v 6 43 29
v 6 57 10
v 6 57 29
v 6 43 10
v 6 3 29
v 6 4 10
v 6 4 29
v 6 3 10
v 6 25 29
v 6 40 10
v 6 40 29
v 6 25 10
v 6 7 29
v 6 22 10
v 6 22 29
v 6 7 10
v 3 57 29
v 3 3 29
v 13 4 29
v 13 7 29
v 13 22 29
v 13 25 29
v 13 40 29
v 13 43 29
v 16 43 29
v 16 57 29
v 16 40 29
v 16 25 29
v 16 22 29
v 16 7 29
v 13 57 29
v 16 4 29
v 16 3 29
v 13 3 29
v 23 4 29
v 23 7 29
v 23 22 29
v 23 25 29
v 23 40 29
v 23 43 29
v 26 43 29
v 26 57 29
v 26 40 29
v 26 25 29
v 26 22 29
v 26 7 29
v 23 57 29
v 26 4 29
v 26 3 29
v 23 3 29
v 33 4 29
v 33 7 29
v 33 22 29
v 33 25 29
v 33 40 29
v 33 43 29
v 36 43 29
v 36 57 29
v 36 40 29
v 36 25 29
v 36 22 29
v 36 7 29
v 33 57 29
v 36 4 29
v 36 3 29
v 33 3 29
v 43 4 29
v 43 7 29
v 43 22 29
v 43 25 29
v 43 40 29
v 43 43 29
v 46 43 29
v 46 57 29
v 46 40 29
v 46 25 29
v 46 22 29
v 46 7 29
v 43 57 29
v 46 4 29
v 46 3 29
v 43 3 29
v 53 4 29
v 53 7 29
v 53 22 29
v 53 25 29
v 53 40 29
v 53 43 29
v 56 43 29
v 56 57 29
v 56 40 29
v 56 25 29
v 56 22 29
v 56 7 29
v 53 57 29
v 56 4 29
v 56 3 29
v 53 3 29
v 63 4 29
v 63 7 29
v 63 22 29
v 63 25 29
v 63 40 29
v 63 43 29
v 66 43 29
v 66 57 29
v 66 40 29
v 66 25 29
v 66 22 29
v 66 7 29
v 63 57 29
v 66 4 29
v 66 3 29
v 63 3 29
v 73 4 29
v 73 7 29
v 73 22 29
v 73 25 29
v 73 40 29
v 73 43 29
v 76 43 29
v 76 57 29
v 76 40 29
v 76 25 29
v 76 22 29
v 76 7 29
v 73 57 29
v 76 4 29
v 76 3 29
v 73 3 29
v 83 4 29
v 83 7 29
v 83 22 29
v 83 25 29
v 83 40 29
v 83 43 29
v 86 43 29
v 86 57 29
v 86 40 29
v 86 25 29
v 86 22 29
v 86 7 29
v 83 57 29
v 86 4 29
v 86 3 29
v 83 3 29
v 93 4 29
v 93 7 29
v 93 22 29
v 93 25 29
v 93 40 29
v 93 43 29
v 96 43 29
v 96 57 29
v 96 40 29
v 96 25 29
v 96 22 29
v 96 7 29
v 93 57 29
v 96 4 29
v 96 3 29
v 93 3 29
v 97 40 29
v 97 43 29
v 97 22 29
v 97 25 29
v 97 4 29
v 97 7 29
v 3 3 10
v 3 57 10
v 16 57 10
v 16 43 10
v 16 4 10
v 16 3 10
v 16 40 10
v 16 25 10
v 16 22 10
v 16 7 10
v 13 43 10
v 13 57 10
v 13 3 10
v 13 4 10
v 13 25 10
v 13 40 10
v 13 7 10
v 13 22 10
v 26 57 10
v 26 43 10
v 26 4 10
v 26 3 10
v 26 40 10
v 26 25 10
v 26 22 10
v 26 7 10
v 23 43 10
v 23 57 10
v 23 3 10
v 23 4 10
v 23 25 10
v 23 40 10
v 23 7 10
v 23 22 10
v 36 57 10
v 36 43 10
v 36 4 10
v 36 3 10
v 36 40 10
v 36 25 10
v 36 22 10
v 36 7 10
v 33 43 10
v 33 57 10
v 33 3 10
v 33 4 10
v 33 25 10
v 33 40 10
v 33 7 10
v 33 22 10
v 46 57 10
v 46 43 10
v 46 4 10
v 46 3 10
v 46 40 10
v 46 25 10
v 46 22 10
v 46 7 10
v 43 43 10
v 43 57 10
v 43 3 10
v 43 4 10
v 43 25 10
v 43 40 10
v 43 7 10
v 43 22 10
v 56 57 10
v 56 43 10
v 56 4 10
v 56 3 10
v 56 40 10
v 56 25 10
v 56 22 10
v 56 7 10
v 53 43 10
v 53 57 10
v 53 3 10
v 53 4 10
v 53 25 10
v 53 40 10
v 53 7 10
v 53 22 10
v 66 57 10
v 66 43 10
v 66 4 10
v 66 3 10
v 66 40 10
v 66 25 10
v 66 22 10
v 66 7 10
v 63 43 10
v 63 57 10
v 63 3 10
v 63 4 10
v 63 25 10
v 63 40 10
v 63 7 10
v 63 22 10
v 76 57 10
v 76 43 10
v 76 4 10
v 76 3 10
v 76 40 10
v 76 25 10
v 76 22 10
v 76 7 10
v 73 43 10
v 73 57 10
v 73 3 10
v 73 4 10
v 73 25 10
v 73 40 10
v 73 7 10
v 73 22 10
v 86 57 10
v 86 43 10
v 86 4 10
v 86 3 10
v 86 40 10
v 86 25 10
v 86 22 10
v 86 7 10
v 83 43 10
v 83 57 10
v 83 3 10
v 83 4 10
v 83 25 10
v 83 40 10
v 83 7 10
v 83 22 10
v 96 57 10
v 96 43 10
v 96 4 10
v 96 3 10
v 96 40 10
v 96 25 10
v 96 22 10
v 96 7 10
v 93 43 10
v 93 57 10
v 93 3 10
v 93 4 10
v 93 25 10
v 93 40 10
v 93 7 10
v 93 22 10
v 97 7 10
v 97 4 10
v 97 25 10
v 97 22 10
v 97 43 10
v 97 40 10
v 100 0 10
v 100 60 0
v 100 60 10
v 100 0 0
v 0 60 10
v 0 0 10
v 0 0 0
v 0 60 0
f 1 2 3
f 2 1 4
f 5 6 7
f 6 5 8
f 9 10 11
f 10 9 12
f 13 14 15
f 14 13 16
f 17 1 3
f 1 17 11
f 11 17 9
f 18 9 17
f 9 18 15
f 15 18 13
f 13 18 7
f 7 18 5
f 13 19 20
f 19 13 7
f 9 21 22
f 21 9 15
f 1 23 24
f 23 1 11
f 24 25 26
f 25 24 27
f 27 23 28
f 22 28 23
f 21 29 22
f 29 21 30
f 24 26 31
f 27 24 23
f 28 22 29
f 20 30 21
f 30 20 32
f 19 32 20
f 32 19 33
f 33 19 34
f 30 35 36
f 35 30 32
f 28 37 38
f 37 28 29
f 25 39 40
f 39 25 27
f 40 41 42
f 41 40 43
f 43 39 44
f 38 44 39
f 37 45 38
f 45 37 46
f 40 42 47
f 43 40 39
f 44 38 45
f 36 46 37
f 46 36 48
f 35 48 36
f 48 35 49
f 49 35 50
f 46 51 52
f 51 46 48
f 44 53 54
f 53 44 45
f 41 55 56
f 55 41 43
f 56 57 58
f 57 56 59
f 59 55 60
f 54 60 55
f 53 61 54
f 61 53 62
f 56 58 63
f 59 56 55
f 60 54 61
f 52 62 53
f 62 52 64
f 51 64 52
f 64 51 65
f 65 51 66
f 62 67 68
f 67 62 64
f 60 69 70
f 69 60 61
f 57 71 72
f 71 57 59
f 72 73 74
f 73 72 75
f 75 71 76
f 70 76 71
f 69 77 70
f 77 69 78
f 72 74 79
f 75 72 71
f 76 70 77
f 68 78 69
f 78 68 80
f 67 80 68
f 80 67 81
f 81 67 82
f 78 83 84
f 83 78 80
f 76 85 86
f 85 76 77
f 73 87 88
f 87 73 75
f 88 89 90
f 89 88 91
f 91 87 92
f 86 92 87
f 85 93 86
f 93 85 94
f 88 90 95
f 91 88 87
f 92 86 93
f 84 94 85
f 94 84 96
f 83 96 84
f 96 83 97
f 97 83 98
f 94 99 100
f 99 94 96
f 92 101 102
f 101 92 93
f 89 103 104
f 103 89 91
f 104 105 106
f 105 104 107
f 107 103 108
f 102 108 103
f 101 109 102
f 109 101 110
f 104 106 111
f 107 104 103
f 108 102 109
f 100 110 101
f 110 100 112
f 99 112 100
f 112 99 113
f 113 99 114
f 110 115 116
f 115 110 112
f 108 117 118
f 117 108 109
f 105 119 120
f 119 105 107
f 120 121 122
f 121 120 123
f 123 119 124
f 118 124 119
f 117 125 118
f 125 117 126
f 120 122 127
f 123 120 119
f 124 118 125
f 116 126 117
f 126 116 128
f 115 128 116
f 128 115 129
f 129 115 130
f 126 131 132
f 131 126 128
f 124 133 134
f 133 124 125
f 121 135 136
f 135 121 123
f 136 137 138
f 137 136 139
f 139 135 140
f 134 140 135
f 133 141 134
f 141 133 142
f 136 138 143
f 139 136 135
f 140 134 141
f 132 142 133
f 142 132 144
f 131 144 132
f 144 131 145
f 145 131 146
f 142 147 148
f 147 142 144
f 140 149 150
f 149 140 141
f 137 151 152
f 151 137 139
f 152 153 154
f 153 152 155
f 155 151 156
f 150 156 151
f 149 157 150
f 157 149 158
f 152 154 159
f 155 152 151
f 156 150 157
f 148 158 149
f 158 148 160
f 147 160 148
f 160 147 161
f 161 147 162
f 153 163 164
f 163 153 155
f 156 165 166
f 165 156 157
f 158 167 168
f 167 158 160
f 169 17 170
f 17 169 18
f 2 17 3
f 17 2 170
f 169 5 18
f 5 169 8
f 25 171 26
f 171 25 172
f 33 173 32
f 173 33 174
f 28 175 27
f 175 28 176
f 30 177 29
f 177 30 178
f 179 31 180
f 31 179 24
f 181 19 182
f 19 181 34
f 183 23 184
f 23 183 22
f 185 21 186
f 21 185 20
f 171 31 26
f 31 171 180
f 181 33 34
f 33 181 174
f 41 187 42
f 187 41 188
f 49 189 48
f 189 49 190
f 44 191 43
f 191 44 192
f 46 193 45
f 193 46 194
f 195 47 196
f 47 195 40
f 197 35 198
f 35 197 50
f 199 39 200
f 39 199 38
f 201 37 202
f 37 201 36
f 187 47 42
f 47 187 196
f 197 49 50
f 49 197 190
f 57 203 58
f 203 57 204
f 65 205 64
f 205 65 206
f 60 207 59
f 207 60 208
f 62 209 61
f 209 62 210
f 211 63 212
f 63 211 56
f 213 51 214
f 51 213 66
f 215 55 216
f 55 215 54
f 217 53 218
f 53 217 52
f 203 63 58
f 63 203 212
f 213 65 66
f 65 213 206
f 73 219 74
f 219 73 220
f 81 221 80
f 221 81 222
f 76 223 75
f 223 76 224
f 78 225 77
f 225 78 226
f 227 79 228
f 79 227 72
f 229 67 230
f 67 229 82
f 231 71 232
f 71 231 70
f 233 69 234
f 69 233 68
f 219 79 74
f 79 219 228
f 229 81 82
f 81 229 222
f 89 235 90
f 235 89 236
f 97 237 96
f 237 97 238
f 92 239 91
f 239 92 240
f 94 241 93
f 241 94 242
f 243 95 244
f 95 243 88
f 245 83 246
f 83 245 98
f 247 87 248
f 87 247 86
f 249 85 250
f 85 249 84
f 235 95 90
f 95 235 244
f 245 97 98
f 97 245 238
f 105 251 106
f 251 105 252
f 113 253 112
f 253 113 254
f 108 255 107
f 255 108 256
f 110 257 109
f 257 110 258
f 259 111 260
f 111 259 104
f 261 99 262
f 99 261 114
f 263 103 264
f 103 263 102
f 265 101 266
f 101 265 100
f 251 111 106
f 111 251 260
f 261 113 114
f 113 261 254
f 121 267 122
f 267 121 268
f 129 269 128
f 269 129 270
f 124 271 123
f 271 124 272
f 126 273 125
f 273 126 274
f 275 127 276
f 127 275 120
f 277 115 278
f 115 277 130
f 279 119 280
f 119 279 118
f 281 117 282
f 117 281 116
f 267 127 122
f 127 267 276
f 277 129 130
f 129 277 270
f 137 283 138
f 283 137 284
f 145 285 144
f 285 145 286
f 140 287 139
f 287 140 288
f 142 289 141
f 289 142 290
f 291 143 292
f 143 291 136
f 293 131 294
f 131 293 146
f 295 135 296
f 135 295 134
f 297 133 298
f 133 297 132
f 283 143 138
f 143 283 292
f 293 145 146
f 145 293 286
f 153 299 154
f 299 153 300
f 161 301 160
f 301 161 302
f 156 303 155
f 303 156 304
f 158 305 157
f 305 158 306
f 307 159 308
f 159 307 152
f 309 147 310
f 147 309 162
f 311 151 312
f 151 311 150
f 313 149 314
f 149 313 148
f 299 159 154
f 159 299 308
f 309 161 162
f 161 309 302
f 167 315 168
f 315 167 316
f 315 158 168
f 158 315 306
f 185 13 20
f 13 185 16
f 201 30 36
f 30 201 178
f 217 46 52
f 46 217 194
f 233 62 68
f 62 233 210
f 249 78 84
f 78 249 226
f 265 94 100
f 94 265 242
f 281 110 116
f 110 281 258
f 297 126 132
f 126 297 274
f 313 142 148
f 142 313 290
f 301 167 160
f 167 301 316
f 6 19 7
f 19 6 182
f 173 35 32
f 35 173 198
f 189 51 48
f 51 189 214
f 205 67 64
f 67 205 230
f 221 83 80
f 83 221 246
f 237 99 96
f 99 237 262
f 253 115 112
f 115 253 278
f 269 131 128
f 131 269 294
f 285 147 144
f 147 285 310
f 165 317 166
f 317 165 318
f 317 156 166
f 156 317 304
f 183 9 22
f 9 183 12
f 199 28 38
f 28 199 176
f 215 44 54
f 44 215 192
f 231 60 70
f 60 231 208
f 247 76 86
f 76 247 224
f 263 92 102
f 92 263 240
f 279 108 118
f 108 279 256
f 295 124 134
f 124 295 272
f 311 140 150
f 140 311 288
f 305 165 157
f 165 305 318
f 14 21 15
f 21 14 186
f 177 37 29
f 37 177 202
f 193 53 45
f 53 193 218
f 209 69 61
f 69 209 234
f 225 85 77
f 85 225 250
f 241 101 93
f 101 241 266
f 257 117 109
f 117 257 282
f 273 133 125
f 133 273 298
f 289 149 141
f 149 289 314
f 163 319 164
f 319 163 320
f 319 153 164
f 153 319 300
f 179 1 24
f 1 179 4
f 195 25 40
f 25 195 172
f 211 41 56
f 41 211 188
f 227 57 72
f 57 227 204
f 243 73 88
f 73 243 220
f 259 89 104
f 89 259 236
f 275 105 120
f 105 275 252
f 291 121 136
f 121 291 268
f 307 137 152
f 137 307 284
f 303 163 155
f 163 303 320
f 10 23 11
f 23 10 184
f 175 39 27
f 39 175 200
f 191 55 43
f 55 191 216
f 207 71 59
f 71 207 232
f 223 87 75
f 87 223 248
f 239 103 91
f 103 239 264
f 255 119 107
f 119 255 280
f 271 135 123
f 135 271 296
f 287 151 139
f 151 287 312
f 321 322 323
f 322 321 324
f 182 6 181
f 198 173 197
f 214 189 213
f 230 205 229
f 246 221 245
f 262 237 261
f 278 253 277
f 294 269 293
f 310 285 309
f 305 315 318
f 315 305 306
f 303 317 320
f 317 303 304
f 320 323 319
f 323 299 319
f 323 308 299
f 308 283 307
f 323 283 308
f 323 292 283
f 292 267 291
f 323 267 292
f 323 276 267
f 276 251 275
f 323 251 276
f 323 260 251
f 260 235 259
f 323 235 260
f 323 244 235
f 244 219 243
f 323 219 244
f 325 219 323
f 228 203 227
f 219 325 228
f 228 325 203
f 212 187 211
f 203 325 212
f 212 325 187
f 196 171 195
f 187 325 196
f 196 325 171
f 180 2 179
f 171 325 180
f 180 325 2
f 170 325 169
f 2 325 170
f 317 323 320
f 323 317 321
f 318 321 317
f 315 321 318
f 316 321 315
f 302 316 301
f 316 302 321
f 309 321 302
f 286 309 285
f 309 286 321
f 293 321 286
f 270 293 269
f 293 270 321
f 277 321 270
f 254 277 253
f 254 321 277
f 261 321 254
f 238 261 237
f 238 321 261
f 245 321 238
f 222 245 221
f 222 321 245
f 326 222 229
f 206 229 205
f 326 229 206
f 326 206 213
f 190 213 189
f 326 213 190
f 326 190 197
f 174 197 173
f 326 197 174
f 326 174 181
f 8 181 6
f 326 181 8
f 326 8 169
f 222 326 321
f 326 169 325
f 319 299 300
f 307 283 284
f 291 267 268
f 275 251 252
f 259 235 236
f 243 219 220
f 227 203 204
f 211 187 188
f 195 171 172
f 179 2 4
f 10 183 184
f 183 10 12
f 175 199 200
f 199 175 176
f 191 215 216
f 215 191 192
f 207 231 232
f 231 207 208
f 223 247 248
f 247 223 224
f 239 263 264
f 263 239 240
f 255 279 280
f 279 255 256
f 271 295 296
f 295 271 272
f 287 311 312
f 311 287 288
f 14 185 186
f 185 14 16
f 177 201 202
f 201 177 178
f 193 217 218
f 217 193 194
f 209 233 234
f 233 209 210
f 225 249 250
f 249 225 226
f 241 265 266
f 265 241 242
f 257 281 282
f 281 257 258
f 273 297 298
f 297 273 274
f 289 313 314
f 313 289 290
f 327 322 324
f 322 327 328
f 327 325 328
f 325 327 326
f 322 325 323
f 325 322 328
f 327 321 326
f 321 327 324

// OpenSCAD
$fn = 32;

// ----------------------------------------------------------------------
// Heatsink: cross fin block
// ----------------------------------------------------------------------

// --- parameters (mm) ---
base_l = 100;             // base length, X
base_w = 60;              // base width, Y
base_t = 10;              // base plate thickness
fin_h = 20;               // fin height above the base
fin_t = 3;                // fin thickness
edge = 3;                 // margin from the base ends
pitch = 10;               // fin pitch
rib_pitch = 18;           // cross rib pitch

n_fins = floor((base_l - 2 * edge - fin_t) / pitch) + 1;  // fin count
total_h = base_t + fin_h - 1;  // overall height
n_ribs = floor((base_w - 2 * edge) / rib_pitch);  // rib count

union() {
  cube([base_l, base_w, base_t]);
  for (i = [0 : n_fins - 1])
    translate([edge + i * pitch, edge, base_t - 1])
      cube([fin_t, base_w - 2 * edge, fin_h]);
  for (i = [0 : n_ribs - 1])
    translate([edge, edge + 1 + i * rib_pitch, base_t - 1])
      cube([base_l - 2 * edge, fin_t, fin_h]);
}
